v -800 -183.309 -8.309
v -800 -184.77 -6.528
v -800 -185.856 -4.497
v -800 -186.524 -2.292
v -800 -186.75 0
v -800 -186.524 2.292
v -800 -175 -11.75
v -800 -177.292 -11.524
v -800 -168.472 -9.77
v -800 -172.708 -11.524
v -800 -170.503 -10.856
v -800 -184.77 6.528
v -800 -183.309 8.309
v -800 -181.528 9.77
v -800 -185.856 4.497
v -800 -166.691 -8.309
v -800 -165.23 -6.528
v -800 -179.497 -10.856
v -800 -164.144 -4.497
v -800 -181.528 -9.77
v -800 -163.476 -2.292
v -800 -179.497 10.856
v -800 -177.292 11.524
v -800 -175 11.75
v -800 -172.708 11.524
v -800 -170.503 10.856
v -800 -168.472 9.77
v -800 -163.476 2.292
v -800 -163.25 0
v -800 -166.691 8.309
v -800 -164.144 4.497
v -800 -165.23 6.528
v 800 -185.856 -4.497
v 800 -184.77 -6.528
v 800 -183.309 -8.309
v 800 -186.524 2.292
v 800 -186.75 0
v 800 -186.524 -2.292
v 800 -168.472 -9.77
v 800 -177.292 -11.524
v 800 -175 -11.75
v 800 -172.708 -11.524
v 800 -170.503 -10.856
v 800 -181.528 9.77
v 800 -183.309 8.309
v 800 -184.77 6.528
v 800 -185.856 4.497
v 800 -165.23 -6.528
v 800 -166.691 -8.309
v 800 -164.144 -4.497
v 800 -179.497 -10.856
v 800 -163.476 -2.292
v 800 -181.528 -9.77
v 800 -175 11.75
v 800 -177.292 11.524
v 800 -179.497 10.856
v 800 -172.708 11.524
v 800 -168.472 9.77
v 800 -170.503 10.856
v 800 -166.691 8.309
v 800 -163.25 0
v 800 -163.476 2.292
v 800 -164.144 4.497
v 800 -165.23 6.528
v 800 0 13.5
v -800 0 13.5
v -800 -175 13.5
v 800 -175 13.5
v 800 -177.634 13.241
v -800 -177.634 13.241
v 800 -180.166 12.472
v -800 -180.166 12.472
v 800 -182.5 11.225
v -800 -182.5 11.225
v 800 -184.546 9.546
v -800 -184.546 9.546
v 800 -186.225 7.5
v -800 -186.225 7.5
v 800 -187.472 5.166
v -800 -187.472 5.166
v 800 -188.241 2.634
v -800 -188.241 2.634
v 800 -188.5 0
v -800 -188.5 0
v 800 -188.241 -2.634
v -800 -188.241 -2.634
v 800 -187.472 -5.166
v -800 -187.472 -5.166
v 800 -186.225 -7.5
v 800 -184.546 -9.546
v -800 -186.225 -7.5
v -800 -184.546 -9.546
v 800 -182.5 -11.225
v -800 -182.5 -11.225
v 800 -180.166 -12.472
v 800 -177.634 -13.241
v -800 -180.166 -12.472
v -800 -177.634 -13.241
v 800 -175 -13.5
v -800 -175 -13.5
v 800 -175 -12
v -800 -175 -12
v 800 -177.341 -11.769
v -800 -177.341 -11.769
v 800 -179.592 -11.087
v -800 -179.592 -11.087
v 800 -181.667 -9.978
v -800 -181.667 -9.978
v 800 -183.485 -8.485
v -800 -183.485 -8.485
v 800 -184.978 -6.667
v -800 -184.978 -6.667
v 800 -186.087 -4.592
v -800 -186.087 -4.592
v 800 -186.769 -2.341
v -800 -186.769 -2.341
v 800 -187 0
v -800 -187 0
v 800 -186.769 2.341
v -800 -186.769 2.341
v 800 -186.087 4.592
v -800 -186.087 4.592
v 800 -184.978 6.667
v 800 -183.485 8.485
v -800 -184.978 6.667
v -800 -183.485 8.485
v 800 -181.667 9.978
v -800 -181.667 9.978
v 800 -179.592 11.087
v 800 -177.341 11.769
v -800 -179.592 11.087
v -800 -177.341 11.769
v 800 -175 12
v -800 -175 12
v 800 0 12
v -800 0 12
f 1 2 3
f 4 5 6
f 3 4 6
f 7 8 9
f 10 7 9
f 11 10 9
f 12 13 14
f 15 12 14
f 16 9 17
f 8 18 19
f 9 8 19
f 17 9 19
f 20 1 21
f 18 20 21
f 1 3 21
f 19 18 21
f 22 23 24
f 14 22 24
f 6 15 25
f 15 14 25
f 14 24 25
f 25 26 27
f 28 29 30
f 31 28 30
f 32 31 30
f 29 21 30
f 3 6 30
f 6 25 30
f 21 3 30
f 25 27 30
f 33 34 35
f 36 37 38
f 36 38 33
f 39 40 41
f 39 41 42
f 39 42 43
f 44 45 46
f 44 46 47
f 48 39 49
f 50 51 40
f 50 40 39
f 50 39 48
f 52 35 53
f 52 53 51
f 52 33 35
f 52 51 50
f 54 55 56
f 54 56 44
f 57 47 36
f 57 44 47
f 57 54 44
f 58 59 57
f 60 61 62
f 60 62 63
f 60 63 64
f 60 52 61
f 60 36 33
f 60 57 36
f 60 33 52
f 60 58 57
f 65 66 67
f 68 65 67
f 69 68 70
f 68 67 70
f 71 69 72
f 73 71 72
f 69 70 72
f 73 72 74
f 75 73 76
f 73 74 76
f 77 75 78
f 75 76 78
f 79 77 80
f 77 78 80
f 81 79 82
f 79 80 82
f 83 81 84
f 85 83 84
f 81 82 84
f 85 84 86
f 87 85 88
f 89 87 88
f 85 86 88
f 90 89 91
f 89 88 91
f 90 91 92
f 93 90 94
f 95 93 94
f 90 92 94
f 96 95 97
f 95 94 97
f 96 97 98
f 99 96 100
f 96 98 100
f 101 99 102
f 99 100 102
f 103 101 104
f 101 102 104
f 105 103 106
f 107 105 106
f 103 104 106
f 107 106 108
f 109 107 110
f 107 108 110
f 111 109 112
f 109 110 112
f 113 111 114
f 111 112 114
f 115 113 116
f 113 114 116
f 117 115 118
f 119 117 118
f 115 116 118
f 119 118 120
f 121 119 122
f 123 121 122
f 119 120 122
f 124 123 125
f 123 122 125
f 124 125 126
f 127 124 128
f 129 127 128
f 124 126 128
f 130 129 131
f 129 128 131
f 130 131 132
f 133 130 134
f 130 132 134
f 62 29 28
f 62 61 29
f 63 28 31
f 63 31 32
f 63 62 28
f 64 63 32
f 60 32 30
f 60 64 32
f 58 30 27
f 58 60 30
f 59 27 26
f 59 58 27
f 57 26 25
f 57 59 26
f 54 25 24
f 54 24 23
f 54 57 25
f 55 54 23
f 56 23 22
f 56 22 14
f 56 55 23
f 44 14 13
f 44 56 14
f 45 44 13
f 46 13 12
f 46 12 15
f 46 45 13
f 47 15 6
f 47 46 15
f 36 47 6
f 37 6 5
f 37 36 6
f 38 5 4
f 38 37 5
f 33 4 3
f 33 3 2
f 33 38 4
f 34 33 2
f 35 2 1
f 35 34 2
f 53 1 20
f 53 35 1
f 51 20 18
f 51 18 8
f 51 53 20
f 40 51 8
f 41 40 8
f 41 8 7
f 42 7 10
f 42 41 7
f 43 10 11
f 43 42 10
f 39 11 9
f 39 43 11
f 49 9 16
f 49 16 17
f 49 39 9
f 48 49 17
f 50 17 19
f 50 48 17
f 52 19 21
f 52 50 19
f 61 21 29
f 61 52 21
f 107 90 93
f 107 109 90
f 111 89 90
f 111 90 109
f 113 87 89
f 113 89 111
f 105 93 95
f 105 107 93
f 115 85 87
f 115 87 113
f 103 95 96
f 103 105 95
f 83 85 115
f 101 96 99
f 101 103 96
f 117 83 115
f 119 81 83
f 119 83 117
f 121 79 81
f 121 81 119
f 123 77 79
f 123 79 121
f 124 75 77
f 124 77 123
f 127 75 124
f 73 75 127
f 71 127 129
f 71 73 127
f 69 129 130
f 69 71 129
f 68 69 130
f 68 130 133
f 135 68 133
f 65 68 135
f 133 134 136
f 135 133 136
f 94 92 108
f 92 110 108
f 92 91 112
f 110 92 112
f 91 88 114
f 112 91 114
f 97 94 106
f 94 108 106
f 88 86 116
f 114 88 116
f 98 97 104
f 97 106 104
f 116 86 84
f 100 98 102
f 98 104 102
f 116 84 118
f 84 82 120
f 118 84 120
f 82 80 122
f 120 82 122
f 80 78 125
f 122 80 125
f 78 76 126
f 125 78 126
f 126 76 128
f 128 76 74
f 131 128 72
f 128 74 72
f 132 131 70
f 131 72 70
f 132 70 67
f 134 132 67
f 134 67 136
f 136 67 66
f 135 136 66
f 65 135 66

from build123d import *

# Parameters (mm, degrees)
F0_R     = 11.75
F1_DEPTH = 800


with BuildPart() as f1:
    # F0 (on Right) → F1 (new body, symmetric)
    with BuildSketch(Plane.YZ):
        with BuildLine():
            Line((0, 13.5), (-175, 13.5))
            ThreePointArc((-175, 13.5), (-188.5, 0), (-175, -13.5))
            Line((-175, -13.5), (-175, -12))
            ThreePointArc((-175, -12), (-187, 0), (-175, 12))
            Line((-175, 12), (0, 12))
            Line((0, 12), (0, 13.5))
        make_face()
        with Locations((-175, 0)):
            Circle(F0_R)
    extrude(amount=F1_DEPTH, both=True)


solid = f1.part
